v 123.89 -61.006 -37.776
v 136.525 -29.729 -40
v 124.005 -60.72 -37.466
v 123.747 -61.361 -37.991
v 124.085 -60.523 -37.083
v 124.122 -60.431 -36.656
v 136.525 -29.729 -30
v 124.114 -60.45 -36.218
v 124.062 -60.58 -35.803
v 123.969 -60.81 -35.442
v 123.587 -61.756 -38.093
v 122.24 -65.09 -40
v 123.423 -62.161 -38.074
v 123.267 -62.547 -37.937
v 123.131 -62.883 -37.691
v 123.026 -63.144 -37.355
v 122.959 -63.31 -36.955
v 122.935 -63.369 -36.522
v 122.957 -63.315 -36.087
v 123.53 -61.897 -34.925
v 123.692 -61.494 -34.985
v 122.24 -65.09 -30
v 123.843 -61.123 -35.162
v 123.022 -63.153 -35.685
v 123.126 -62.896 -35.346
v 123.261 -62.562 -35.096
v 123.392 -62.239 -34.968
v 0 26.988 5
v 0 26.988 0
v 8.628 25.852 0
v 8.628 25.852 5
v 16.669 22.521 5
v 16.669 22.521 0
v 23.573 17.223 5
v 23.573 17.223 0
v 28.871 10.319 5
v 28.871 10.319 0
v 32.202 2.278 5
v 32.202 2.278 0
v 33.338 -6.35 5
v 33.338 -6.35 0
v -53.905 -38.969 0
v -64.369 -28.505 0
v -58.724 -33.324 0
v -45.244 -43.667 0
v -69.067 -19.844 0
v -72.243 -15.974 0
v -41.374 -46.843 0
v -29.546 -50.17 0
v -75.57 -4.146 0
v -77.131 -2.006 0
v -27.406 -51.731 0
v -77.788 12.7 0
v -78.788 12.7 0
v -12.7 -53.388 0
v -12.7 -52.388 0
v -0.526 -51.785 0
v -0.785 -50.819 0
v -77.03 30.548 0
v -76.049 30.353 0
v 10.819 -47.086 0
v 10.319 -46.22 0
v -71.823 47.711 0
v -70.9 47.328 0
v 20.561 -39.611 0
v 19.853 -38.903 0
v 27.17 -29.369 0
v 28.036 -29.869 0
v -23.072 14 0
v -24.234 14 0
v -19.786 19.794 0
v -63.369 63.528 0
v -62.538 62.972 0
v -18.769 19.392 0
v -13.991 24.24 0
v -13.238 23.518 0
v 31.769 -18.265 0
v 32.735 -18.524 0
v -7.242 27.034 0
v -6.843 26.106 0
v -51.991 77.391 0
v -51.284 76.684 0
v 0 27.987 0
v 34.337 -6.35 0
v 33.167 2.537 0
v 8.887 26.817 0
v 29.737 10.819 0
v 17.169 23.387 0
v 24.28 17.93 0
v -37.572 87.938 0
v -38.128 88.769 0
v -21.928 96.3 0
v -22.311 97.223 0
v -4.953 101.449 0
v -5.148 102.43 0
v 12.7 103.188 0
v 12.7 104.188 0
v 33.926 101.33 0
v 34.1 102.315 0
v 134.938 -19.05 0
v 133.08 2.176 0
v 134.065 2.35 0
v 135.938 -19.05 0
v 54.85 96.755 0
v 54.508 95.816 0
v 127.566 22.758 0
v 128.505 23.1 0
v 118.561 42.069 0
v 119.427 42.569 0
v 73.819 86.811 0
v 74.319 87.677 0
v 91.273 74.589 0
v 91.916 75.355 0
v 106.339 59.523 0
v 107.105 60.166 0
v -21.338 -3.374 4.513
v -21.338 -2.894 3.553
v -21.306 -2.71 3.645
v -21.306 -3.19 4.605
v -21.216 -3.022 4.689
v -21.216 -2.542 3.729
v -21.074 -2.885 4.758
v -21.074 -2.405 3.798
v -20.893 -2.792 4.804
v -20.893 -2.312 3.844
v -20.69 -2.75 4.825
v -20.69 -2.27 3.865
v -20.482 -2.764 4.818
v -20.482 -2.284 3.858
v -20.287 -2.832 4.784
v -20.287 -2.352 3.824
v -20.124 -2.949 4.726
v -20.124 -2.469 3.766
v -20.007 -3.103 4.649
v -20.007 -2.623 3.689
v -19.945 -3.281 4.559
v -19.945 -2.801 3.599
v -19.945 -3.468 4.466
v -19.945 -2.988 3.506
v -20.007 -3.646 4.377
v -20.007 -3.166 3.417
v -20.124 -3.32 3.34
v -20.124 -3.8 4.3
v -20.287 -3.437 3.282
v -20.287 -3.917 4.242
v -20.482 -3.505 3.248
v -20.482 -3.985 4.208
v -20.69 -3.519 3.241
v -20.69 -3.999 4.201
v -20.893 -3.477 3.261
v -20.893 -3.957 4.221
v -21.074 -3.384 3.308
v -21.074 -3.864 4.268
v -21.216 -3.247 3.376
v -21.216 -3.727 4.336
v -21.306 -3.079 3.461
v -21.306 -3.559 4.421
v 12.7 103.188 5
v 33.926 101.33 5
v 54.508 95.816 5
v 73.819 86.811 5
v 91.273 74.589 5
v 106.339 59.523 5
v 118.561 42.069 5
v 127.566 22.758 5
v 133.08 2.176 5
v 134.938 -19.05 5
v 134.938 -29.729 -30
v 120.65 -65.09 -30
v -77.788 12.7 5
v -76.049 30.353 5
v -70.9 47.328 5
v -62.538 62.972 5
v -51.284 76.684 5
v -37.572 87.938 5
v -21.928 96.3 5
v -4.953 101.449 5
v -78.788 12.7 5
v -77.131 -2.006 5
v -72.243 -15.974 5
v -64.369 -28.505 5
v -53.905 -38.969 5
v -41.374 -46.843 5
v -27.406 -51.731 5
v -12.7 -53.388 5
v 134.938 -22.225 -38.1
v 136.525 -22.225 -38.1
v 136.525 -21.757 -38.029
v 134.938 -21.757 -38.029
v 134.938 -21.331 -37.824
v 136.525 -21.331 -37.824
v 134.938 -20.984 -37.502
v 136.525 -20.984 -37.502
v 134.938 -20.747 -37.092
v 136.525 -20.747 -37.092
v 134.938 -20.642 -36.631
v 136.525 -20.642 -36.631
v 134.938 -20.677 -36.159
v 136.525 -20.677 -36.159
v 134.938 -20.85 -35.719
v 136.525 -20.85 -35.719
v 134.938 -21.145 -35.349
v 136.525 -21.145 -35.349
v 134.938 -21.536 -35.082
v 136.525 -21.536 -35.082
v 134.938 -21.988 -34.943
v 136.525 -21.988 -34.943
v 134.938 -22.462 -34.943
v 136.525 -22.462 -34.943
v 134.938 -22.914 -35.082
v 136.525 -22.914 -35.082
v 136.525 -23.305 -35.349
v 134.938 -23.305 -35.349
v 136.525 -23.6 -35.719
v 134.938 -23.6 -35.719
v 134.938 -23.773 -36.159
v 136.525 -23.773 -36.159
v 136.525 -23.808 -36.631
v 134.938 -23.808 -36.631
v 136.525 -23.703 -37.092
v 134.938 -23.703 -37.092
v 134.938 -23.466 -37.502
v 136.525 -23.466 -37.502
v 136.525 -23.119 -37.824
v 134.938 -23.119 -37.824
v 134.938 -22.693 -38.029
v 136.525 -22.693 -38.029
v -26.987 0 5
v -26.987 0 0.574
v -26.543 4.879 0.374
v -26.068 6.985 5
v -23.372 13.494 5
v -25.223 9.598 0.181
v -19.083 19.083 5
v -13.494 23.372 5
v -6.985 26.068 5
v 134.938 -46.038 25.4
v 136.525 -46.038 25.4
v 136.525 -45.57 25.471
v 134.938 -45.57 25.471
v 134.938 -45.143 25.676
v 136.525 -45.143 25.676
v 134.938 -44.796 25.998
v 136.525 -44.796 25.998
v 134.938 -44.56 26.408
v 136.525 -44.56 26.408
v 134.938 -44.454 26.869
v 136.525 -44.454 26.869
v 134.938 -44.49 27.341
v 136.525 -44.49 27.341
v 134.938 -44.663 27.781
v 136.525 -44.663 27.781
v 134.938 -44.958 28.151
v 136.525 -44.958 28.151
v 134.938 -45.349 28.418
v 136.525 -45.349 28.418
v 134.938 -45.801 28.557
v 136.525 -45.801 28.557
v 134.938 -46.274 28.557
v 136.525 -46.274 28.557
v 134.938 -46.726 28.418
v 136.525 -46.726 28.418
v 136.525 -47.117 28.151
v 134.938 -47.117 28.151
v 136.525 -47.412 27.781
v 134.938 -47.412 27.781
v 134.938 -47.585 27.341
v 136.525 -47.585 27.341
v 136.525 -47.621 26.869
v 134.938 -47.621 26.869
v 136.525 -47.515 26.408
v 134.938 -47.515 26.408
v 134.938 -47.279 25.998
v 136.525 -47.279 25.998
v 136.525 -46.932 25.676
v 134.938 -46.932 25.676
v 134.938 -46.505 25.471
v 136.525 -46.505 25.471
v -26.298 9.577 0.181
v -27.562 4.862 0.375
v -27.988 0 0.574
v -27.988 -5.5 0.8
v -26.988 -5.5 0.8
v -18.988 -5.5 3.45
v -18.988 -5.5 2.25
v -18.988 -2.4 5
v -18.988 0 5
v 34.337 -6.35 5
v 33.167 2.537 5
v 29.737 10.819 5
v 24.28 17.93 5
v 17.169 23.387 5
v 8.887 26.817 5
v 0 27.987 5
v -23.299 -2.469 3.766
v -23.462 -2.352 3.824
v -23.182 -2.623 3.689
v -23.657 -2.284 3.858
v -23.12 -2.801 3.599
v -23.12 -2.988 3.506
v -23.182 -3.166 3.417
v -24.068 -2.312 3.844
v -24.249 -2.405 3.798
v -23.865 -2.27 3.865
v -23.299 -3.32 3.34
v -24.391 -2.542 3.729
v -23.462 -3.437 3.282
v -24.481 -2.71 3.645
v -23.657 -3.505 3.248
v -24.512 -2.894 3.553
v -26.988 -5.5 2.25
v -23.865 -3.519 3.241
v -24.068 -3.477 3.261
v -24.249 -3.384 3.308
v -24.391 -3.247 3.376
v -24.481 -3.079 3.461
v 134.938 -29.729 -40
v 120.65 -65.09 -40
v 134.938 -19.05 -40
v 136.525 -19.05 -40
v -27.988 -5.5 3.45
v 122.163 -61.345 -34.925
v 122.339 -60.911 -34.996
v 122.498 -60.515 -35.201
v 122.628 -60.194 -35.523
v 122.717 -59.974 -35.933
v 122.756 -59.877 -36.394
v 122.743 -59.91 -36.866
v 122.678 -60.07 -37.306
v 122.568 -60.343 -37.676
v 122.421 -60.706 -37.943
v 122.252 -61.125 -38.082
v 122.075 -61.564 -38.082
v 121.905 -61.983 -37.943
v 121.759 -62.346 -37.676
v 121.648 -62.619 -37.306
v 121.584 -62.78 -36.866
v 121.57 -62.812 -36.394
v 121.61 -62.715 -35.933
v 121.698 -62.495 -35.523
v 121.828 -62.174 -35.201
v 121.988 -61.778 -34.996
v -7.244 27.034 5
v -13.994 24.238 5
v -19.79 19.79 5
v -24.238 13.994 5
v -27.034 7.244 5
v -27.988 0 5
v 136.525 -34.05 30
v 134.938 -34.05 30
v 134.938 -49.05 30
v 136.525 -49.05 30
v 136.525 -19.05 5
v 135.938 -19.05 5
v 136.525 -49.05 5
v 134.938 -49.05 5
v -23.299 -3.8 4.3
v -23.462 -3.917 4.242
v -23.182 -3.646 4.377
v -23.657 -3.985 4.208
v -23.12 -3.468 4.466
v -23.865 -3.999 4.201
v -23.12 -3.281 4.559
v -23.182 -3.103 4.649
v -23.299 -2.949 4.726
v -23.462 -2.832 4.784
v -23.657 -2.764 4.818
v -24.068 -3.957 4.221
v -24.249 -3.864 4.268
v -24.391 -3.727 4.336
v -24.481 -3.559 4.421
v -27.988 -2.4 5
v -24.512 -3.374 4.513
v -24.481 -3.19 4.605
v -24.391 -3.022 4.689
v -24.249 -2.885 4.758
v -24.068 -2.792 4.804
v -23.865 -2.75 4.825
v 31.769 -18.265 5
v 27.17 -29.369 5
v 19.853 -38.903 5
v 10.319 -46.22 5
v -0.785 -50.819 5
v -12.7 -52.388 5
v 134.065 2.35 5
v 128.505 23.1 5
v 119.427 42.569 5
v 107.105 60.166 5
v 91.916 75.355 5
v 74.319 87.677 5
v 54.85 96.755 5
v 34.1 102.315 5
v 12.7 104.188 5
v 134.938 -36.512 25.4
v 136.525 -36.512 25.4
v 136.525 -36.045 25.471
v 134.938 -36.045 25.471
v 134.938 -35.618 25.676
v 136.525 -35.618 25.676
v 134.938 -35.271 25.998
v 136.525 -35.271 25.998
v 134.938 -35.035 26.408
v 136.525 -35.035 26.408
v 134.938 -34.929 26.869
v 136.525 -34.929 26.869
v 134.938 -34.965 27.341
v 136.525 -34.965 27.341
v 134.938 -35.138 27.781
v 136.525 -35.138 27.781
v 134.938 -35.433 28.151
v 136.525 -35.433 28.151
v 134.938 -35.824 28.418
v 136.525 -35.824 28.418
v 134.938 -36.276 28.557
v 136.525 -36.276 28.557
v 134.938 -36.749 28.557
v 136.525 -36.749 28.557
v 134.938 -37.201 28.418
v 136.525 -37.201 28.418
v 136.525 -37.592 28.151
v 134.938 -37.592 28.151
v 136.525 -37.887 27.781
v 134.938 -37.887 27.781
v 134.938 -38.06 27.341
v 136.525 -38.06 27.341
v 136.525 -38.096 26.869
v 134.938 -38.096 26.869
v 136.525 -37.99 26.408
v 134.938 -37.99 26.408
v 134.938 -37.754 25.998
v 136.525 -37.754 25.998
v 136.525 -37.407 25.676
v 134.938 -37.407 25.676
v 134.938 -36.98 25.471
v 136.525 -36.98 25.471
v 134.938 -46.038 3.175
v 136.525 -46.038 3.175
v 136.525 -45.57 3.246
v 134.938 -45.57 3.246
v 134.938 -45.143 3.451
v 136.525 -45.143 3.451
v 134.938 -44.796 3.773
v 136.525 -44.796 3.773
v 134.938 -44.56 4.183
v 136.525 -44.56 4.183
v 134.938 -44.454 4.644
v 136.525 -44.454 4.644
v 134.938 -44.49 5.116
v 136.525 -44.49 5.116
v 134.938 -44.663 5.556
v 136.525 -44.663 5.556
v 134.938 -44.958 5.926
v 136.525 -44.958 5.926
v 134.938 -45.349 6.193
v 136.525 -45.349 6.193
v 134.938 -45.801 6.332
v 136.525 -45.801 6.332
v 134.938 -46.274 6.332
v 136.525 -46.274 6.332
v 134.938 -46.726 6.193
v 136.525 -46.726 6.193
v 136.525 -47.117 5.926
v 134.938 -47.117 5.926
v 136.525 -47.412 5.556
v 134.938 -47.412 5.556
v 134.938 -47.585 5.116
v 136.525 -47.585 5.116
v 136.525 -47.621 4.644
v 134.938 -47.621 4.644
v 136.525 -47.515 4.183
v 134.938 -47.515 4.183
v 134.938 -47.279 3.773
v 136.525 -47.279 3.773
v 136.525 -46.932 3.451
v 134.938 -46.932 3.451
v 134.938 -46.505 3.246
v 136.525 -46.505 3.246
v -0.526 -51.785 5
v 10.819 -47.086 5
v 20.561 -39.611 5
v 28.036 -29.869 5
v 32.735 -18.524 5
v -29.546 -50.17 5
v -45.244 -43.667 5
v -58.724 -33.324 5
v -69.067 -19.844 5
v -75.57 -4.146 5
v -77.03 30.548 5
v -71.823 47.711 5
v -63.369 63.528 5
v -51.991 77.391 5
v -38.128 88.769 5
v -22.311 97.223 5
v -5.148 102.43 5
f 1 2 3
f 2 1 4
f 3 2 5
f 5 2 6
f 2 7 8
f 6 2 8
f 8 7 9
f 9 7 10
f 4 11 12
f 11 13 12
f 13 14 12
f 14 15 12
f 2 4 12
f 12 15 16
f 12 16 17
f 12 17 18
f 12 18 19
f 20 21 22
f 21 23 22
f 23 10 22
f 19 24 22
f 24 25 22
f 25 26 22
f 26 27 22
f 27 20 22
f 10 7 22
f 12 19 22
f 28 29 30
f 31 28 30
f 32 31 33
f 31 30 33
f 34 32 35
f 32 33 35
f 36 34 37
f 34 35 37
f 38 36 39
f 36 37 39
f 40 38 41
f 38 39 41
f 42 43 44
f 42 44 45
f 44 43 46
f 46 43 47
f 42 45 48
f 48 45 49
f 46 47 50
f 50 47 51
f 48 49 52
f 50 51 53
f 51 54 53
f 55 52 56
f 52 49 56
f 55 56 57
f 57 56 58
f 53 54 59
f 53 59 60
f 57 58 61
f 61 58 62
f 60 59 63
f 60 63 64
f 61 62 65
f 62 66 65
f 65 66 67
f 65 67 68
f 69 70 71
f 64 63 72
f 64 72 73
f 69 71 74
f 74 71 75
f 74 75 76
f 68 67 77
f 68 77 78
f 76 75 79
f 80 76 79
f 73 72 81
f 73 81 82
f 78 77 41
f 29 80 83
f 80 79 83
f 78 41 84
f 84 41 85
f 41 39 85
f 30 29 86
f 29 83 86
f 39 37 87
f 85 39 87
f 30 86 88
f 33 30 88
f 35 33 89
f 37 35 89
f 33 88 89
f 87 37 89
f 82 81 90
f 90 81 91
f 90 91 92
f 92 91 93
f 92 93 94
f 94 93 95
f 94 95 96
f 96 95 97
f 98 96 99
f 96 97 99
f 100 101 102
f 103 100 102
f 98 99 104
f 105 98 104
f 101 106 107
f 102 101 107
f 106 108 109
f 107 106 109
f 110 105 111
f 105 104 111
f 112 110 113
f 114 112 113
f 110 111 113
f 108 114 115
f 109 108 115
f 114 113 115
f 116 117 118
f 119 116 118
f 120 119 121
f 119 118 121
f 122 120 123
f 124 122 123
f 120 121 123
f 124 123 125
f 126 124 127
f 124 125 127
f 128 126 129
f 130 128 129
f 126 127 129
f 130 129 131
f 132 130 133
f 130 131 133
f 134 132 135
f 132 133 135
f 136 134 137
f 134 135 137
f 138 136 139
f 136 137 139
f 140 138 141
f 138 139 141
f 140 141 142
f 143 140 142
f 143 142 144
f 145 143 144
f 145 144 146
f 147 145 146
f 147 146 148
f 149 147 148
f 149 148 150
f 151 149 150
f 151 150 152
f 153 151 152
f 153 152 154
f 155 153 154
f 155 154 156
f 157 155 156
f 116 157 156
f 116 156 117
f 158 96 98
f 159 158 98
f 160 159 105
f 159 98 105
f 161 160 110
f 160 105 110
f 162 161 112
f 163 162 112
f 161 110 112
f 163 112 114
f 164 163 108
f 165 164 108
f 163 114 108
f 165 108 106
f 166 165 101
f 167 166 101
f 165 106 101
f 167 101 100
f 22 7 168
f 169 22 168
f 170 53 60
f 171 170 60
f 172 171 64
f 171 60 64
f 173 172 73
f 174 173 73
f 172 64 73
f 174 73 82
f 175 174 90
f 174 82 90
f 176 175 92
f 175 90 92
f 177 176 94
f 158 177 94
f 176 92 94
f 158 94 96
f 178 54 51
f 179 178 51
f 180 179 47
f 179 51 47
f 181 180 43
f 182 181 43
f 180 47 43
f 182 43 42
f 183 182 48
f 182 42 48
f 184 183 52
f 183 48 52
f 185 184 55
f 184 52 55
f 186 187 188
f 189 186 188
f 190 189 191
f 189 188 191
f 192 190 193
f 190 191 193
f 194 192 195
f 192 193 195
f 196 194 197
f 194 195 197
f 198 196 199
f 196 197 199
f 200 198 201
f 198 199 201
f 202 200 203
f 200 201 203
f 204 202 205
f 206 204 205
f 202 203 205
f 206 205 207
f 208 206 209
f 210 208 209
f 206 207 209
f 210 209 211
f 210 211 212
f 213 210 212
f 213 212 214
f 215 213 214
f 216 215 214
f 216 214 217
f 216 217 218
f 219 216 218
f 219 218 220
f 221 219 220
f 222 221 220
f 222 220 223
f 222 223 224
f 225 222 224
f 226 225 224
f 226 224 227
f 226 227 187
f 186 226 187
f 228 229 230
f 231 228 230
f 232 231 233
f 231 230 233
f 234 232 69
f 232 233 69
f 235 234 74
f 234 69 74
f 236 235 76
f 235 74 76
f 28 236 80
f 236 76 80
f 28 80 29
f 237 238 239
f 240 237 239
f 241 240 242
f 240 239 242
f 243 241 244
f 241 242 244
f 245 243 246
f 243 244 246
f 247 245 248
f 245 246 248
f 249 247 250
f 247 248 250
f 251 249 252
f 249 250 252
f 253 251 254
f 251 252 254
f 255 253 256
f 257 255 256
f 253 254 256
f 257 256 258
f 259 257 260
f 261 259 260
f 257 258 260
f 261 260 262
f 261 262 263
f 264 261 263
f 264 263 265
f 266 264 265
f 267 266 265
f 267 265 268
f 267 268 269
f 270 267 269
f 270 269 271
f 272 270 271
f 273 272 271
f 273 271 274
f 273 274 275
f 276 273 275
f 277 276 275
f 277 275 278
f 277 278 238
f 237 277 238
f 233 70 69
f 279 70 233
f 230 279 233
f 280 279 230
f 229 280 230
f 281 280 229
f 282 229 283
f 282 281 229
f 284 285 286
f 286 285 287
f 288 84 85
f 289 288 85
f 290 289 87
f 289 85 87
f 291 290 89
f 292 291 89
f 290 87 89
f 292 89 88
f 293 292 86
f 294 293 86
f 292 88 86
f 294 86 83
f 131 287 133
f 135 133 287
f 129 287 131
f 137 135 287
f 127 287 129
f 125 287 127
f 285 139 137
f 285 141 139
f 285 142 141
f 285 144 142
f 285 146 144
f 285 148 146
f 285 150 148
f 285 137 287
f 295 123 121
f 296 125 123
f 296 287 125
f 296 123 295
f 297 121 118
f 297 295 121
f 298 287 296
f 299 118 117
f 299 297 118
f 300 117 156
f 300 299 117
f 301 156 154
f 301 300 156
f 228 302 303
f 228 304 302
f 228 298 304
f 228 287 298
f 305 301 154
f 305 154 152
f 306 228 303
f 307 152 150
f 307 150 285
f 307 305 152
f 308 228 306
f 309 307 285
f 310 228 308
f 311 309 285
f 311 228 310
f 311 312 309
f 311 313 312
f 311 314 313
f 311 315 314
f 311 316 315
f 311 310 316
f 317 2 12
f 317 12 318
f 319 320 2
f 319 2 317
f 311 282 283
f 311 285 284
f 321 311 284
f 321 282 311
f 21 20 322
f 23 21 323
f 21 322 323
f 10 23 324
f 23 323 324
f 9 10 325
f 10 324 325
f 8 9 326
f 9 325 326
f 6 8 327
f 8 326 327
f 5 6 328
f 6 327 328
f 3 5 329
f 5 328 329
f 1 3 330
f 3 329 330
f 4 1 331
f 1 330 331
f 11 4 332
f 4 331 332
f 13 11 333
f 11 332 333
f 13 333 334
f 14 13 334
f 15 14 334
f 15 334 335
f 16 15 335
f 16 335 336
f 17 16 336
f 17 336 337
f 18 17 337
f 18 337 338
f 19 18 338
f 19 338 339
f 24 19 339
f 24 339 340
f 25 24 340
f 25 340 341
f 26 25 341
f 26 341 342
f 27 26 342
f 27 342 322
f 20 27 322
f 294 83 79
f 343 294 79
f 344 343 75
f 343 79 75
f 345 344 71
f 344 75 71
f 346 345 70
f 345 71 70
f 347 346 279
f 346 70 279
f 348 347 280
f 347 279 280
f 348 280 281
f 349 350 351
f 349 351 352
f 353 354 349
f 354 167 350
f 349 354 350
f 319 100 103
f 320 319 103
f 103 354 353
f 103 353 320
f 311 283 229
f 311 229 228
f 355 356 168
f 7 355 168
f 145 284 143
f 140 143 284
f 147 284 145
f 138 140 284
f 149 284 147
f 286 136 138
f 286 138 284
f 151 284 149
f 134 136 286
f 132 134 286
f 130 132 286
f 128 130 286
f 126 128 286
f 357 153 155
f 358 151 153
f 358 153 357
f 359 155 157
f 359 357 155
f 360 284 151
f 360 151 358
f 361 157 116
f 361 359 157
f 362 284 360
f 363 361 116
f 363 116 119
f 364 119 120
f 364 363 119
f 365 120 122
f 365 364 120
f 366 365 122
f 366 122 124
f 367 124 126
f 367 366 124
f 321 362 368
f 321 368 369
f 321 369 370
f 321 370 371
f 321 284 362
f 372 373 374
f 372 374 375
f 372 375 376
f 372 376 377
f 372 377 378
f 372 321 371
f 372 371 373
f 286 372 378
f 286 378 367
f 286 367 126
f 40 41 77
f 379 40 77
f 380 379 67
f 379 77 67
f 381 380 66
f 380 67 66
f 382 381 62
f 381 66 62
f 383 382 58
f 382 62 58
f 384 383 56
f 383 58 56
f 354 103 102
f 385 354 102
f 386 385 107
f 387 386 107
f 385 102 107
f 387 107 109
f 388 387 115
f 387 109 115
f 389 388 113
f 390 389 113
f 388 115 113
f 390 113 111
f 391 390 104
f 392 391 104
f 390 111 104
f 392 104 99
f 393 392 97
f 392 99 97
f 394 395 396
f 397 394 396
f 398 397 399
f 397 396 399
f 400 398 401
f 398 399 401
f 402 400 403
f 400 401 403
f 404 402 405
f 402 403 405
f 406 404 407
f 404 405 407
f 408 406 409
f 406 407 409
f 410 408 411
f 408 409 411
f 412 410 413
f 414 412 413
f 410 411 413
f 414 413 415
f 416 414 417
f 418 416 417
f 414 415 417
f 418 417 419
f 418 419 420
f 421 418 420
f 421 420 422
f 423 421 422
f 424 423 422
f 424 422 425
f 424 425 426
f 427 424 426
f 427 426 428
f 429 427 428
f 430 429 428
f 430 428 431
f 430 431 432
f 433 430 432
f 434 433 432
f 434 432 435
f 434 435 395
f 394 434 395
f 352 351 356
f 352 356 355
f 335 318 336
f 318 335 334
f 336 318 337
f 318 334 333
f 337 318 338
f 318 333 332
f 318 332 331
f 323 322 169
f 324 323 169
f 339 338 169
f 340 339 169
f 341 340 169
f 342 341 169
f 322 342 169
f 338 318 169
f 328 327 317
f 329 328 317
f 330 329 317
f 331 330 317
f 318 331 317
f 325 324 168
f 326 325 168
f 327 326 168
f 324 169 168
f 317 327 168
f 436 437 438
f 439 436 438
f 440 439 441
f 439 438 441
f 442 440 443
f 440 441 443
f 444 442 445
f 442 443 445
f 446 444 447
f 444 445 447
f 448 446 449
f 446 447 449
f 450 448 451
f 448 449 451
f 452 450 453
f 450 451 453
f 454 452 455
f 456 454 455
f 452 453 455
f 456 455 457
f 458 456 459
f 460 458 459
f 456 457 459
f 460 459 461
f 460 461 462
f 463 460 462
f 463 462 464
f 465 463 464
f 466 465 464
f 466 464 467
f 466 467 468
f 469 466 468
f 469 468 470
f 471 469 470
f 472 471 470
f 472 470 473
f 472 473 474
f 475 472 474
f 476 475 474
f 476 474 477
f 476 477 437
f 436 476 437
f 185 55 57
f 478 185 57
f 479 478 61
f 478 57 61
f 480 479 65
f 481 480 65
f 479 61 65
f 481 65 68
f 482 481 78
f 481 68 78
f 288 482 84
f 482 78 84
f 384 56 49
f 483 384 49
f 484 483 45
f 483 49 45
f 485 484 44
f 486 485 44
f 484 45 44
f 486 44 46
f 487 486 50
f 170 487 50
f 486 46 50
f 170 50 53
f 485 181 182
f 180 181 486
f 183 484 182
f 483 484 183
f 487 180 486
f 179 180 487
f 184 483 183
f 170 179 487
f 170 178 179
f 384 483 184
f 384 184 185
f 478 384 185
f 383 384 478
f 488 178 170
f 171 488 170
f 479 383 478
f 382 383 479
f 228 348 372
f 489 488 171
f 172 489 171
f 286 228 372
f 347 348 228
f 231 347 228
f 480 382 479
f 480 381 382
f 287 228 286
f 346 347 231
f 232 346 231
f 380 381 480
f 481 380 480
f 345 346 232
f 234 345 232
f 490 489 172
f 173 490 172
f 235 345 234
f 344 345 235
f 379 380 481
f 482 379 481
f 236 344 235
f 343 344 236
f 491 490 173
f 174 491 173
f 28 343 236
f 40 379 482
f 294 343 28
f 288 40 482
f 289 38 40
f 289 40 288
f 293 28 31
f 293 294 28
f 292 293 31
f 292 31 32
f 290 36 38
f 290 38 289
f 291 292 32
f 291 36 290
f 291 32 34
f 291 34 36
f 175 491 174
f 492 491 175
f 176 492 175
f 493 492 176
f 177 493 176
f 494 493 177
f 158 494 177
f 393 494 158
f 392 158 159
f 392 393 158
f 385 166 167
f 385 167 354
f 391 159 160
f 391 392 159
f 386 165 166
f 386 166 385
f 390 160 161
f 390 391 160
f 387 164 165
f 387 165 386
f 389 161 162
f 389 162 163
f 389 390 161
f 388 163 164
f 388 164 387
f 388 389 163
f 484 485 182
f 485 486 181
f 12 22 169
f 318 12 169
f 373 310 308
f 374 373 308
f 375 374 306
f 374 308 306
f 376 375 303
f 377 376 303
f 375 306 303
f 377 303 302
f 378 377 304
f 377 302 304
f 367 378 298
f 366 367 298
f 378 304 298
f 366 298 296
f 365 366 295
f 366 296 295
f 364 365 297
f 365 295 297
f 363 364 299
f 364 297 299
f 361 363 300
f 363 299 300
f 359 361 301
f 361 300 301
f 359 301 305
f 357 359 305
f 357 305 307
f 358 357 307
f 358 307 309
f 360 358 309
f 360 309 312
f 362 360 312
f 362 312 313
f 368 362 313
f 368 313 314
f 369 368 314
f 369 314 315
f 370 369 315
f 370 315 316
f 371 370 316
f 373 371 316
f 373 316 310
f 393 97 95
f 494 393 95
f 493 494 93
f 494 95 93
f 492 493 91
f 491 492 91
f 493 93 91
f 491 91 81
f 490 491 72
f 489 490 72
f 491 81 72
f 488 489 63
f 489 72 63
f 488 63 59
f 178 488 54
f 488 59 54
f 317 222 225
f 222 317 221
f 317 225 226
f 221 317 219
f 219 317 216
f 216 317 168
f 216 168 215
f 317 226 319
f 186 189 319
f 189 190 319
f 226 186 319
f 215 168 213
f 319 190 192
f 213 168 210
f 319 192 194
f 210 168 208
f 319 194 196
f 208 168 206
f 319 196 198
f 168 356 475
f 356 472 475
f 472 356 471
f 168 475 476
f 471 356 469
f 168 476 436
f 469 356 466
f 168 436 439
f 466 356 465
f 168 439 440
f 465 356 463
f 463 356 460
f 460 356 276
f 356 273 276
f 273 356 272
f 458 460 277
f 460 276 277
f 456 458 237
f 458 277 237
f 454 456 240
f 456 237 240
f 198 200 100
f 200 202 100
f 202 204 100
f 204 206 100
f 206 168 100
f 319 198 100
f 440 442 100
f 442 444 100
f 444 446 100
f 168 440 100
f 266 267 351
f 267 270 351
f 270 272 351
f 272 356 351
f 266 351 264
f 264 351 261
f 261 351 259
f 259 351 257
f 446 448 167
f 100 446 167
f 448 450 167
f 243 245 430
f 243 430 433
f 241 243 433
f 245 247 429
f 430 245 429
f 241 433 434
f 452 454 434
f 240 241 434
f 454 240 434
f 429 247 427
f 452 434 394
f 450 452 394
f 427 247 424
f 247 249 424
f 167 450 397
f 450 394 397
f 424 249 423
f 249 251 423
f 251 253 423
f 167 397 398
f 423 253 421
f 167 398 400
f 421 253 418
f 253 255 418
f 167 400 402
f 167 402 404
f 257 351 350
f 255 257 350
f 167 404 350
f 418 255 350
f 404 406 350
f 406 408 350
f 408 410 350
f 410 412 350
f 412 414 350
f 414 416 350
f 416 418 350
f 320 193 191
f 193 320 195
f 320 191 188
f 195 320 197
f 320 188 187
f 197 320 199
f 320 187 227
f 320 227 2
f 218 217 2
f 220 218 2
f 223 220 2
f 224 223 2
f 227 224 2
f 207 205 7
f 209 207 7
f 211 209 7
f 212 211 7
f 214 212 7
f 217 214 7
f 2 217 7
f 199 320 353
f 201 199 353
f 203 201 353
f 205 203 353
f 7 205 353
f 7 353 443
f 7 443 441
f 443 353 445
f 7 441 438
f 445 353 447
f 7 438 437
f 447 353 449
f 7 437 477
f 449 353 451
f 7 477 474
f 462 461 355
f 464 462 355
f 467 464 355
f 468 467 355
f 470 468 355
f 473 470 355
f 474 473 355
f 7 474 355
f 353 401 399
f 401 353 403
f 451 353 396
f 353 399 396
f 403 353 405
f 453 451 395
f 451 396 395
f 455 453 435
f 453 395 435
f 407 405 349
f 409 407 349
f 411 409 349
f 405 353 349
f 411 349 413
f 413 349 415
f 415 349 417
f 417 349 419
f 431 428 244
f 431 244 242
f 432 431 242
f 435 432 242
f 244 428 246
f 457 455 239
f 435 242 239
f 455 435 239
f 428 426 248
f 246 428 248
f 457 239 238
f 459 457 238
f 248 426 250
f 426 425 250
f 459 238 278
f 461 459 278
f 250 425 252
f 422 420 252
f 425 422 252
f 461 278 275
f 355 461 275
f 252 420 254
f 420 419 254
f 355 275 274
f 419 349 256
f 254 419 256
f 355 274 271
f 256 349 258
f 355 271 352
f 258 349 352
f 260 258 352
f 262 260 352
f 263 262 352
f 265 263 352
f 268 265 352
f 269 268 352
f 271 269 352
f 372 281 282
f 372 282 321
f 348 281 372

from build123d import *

# Parameters (mm, degrees)
EXTRUDE2_DEPTH     = 5
SKETCH3_W          = 1
SKETCH3_H          = 5
EXTRUDE3_DEPTH     = 10
CUT_EXTRUDE2_DEPTH = 5
EXTRUDE5_DEPTH     = 8
SKETCH8_W          = 1.5875
SKETCH8_H          = 5
EXTRUDE6_DEPTH     = 30
SKETCH9_W          = 1.5875
SKETCH9_H          = 30
EXTRUDE7_DEPTH     = 30
SKETCH10_W         = 1.5875
SKETCH10_H         = 30
EXTRUDE8_DEPTH     = 25
CUT_EXTRUDE3_DEPTH = 5
CUT_EXTRUDE4_DEPTH = 5
CUT_EXTRUDE6_DEPTH = 15
SKETCH15_R         = 0.7
CUT_EXTRUDE7_DEPTH = 10
EXTRUDE9_DEPTH     = 10
SKETCH18_R         = 1.5875
CUT_EXTRUDE8_DEPTH = 3
SKETCH19_R         = 1.5875
CUT_EXTRUDE9_DEPTH = 3


with BuildPart() as part:
    # Sketch2 → Extrude2 (new body)
    with BuildSketch(Plane.XY):
        with BuildLine():
            Line((-27.9875, 0), (-26.9875, 0))
            ThreePointArc((-26.9875, 0), (-19.083044257, 19.083044257), (0, 26.9875))
            ThreePointArc((0, 26.9875), (23.573172318, 17.223172318), (33.3375, -6.35))
            ThreePointArc((33.3375, -6.35), (19.853428439, -38.903428439), (-12.7, -52.3875))
            ThreePointArc((-12.7, -52.3875), (-58.72381262, -33.32381262), (-77.7875, 12.7))
            ThreePointArc((-77.7875, 12.7), (-51.284324863, 76.684324863), (12.7, 103.1875))
            ThreePointArc((12.7, 103.1875), (99.134965165, 67.384965165), (134.9375, -19.05))
            Line((134.9375, -19.05), (135.9375, -19.05))
            ThreePointArc((135.9375, -19.05), (99.842071946, 68.092071946), (12.7, 104.1875))
            ThreePointArc((12.7, 104.1875), (-51.991431644, 77.391431644), (-78.7875, 12.7))
            ThreePointArc((-78.7875, 12.7), (-59.430919402, -34.030919402), (-12.7, -53.3875))
            ThreePointArc((-12.7, -53.3875), (20.56053522, -39.61053522), (34.3375, -6.35))
            ThreePointArc((34.3375, -6.35), (24.280279099, 17.930279099), (0, 27.9875))
            ThreePointArc((0, 27.9875), (-19.790151038, 19.790151038), (-27.9875, 0))
        make_face()
    extrude(amount=EXTRUDE2_DEPTH)

    # Sketch3 → Extrude3 (add)
    with BuildSketch(Plane.XZ):
        with Locations((-27.4875, 2.5)):
            Rectangle(SKETCH3_W, SKETCH3_H)
    extrude(amount=EXTRUDE3_DEPTH)

    # Sketch6 → Cut-Extrude2 (cut)
    with BuildSketch(Plane(origin=(-26.9875, 0, 0), x_dir=(0, 0, -1), z_dir=(1, 0, 0))):
        Polygon((-5, -2.4), (-1.2, -10), (-5, -10), align=None)
    extrude(amount=-CUT_EXTRUDE2_DEPTH, mode=Mode.SUBTRACT)

    # Sketch7 → Extrude5 (add)
    with BuildSketch(Plane(origin=(-26.9875, 0, 0), x_dir=(0, 0, -1), z_dir=(1, 0, 0))):
        Polygon((-5, 0), (0, -10), (-1.2, -10), (-5, -2.4), align=None)
    extrude(amount=EXTRUDE5_DEPTH)

    # Sketch8 → Extrude6 (add)
    with BuildSketch(Plane.XZ.offset(19.05)):
        with Locations((135.73125, 2.5)):
            Rectangle(SKETCH8_W, SKETCH8_H)
    extrude(amount=EXTRUDE6_DEPTH)

    # Sketch9 → Extrude7 (add)
    with BuildSketch(Plane(origin=(0, 0, 0), x_dir=(-1, 0, 0), z_dir=(0, 0, -1))):
        with Locations((-135.73125, -34.05)):
            Rectangle(SKETCH9_W, SKETCH9_H)
    extrude(amount=EXTRUDE7_DEPTH)

    # Sketch10 → Extrude8 (add)
    with BuildSketch(Plane.XY.offset(5)):
        with Locations((135.73125, -34.05)):
            Rectangle(SKETCH10_W, SKETCH10_H)
    extrude(amount=EXTRUDE8_DEPTH)

    # Sketch11 → Cut-Extrude3 (cut)
    with BuildSketch(Plane.ZY.offset(-134.9375)):
        Polygon((5, -19.05), (30, -34.05), (30, -19.05), align=None)
    extrude(amount=-CUT_EXTRUDE3_DEPTH, mode=Mode.SUBTRACT)

    # Sketch12 → Cut-Extrude4 (cut)
    with BuildSketch(Plane.ZY.offset(-134.9375)):
        Polygon((5, -49.05), (-30, -29.728735128), (-30, -49.05), align=None)
    extrude(amount=-CUT_EXTRUDE4_DEPTH, mode=Mode.SUBTRACT)

    # Sketch14 → Cut-Extrude6 (cut)
    with BuildSketch(Plane.ZY.offset(27.9875)):
        Polygon((0, -5.5), (0, 14), (0.8, -5.5), (4.7625, -5.5), (4.7625, -10), (0, -10), align=None)
    extrude(amount=-CUT_EXTRUDE6_DEPTH, mode=Mode.SUBTRACT)

    # Sketch15 → Cut-Extrude7 (cut)
    with BuildSketch(Plane(origin=(0, -2, 4), x_dir=(-1, 0, 0), z_dir=(0, 0.447213595, -0.894427191))):
        with Locations((23.8125, -1)):
            Circle(SKETCH15_R)
        with Locations((20.6375, -1)):
            Circle(SKETCH15_R)
    extrude(amount=-CUT_EXTRUDE7_DEPTH, mode=Mode.SUBTRACT)

    # Sketch17 → Extrude9 (add)
    with BuildSketch(Plane(origin=(0, 0, -30), x_dir=(-1, 0, 0), z_dir=(0, 0, -1))):
        Polygon((-136.525, -19.05), (-136.525, -29.728735128), (-122.24, -65.09), (-120.65, -65.09), (-134.9375, -29.728735128), (-134.9375, -19.05), align=None)
    extrude(amount=EXTRUDE9_DEPTH)

    # Sketch18 → Cut-Extrude8 (cut)
    with BuildSketch(Plane(origin=(126.326271119, -51.041347224, 0), x_dir=(0, 0, 1), z_dir=(-0.927178193, 0.374620605, 0))):
        with Locations((-36.5125, -11.1125)):
            Circle(SKETCH18_R)
    extrude(amount=-CUT_EXTRUDE8_DEPTH, mode=Mode.SUBTRACT)

    # Sketch19 → Cut-Extrude9 (cut)
    with BuildSketch(Plane(origin=(136.525, 0, 0), x_dir=(0, 0, -1), z_dir=(1, 0, 0))):
        with Locations((-26.9875, -46.0375)):
            Circle(SKETCH19_R)
        with Locations((-26.9875, -36.5125)):
            Circle(SKETCH19_R)
        with Locations((-4.7625, -46.0375)):
            Circle(SKETCH19_R)
        with Locations((36.5125, -22.225)):
            Circle(SKETCH19_R)
    extrude(amount=-CUT_EXTRUDE9_DEPTH, mode=Mode.SUBTRACT)


solid = part.part
